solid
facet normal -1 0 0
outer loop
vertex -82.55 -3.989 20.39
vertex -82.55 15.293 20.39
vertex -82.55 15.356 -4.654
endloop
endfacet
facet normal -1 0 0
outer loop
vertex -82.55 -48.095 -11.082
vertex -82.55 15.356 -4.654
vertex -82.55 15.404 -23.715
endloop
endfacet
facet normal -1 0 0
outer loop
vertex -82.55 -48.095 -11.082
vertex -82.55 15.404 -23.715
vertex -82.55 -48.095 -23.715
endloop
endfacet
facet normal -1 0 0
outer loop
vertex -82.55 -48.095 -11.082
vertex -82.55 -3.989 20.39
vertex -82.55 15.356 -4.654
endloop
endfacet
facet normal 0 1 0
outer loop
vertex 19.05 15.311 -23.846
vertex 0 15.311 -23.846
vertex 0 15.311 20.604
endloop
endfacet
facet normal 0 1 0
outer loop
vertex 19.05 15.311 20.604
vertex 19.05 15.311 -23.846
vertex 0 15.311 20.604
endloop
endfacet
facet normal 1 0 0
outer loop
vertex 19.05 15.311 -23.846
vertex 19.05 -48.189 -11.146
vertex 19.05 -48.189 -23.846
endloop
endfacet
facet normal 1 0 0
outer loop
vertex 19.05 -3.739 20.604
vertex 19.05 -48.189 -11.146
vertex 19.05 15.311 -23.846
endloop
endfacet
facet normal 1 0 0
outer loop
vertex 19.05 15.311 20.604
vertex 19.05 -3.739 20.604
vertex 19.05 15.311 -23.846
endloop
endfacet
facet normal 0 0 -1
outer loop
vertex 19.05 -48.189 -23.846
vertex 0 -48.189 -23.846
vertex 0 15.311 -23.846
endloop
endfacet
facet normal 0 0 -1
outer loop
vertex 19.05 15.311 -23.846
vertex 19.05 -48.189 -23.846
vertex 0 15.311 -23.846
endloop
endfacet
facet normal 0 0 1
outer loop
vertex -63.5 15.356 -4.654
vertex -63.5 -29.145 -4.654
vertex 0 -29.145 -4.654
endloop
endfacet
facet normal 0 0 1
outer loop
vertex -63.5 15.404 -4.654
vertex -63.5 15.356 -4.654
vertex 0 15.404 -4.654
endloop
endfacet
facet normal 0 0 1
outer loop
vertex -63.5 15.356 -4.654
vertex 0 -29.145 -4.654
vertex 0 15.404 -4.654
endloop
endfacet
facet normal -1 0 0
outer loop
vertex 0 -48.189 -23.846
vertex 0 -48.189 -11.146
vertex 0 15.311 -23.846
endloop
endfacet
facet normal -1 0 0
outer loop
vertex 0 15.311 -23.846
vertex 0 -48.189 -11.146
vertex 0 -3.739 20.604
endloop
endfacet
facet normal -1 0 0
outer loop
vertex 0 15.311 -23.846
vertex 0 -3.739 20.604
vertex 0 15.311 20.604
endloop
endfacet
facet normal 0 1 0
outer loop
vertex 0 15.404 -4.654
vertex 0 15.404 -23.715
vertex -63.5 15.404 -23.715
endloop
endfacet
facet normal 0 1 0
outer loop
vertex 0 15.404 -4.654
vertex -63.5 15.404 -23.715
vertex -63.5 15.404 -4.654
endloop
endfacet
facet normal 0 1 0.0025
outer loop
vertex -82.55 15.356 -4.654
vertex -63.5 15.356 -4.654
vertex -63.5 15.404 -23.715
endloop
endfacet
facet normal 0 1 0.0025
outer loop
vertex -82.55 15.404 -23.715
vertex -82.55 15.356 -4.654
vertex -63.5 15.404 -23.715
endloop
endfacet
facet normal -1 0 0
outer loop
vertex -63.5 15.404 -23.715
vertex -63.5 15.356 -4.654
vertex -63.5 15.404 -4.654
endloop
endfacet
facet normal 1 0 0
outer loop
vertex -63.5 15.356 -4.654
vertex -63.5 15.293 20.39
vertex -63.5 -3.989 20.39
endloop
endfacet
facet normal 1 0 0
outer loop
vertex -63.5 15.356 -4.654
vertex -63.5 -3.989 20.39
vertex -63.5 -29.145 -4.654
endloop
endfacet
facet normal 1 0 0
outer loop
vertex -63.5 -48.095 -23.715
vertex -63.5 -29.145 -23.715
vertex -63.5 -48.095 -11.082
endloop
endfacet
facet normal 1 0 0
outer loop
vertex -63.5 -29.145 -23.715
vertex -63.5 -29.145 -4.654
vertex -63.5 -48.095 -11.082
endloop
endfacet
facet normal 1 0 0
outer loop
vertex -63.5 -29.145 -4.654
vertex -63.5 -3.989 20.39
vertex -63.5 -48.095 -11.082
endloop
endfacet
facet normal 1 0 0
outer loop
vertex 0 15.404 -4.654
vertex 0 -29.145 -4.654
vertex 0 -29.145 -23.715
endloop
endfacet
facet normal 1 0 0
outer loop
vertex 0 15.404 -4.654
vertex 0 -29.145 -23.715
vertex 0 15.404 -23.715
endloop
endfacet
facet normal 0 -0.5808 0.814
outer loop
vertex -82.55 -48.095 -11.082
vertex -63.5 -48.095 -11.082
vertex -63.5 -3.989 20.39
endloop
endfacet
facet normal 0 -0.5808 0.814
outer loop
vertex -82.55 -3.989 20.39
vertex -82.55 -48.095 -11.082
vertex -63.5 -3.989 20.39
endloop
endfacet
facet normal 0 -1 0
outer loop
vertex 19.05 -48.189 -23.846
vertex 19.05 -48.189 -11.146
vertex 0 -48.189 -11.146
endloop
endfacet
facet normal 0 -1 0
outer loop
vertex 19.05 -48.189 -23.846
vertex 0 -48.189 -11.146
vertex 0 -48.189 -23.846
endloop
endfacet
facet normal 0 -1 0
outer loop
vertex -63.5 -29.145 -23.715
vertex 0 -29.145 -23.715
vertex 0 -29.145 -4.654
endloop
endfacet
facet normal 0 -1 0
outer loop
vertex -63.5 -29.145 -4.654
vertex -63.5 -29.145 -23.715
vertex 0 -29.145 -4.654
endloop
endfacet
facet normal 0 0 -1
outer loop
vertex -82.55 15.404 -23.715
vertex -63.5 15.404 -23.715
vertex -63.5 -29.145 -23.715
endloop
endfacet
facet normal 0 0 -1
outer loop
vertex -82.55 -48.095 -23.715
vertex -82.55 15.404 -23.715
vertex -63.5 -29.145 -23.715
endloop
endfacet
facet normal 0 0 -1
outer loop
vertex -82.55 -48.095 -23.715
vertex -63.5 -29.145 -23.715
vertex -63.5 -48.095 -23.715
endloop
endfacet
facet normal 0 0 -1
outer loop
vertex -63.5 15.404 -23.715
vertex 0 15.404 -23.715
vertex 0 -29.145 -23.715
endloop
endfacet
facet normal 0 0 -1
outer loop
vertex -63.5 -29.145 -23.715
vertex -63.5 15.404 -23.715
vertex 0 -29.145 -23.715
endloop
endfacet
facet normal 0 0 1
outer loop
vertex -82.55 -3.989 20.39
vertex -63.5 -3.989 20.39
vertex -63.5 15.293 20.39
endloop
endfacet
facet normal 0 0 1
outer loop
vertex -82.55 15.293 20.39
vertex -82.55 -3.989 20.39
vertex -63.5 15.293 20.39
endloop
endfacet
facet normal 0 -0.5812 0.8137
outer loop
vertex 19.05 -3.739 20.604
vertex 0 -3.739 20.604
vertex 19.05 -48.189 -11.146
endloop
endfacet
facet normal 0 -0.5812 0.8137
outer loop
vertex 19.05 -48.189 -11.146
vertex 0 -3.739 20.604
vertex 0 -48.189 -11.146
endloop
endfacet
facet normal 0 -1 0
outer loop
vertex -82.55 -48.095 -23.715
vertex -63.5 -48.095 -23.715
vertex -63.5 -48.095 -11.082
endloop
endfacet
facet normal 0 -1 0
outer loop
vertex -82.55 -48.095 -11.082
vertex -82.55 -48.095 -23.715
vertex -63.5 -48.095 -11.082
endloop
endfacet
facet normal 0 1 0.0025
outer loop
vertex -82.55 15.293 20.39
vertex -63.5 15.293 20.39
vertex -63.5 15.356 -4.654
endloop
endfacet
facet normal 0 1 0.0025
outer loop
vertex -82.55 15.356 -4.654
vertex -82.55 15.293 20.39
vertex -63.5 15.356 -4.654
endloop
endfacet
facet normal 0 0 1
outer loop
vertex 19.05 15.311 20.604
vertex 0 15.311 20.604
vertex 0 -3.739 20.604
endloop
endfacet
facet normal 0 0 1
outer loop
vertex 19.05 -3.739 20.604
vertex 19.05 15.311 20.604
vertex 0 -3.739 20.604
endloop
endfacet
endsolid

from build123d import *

# Parameters (mm, degrees)
F1_DEPTH = 19.05
F2_W     = 44.5485021919
F2_H     = 19.0605525859
F3_DEPTH = 63.5
F5_DEPTH = 19.05


with BuildPart() as f1:
    # F0 (on Right) → F1 (new body)
    with BuildSketch(Plane.YZ):
        Polygon((15.3113486357, 20.6044124255), (-3.7386513643, 20.6044124255), (-48.1886513643, -11.1455875745), (-48.1886513643, -23.8455875745), (15.3113486357, -23.8455875745), align=None)
    extrude(amount=F1_DEPTH)


with BuildPart() as f3:
    # F2 (on Right) → F3 (new body)
    with BuildSketch(Plane.YZ):
        with Locations((-6.8706655875, -14.1845976468)):
            Rectangle(F2_W, F2_H)
    extrude(amount=-F3_DEPTH)

    # F4 (on face) → F5 (join)
    with BuildSketch(Plane(origin=(-63.5, 0, 0), x_dir=(0, -1, 0), z_dir=(-1, 0, 0))):
        Polygon((29.1449166834, -4.6543213539), (29.1449166834, -23.7148739398), (48.0946525931, -23.7148739398), (48.0946525931, -11.0817179084), (3.9894175716, 20.3903596848), (-15.2927702293, 20.3903596848), (-15.3556954899, -4.6543213539), align=None)
        Polygon((-15.3556954899, -4.6543213539), (-15.4035855085, -23.7148739398), (29.1449166834, -23.7148739398), (29.1449166834, -4.6543213539), align=None)
    extrude(amount=F5_DEPTH)


solid = Compound([f1.part, f3.part])
